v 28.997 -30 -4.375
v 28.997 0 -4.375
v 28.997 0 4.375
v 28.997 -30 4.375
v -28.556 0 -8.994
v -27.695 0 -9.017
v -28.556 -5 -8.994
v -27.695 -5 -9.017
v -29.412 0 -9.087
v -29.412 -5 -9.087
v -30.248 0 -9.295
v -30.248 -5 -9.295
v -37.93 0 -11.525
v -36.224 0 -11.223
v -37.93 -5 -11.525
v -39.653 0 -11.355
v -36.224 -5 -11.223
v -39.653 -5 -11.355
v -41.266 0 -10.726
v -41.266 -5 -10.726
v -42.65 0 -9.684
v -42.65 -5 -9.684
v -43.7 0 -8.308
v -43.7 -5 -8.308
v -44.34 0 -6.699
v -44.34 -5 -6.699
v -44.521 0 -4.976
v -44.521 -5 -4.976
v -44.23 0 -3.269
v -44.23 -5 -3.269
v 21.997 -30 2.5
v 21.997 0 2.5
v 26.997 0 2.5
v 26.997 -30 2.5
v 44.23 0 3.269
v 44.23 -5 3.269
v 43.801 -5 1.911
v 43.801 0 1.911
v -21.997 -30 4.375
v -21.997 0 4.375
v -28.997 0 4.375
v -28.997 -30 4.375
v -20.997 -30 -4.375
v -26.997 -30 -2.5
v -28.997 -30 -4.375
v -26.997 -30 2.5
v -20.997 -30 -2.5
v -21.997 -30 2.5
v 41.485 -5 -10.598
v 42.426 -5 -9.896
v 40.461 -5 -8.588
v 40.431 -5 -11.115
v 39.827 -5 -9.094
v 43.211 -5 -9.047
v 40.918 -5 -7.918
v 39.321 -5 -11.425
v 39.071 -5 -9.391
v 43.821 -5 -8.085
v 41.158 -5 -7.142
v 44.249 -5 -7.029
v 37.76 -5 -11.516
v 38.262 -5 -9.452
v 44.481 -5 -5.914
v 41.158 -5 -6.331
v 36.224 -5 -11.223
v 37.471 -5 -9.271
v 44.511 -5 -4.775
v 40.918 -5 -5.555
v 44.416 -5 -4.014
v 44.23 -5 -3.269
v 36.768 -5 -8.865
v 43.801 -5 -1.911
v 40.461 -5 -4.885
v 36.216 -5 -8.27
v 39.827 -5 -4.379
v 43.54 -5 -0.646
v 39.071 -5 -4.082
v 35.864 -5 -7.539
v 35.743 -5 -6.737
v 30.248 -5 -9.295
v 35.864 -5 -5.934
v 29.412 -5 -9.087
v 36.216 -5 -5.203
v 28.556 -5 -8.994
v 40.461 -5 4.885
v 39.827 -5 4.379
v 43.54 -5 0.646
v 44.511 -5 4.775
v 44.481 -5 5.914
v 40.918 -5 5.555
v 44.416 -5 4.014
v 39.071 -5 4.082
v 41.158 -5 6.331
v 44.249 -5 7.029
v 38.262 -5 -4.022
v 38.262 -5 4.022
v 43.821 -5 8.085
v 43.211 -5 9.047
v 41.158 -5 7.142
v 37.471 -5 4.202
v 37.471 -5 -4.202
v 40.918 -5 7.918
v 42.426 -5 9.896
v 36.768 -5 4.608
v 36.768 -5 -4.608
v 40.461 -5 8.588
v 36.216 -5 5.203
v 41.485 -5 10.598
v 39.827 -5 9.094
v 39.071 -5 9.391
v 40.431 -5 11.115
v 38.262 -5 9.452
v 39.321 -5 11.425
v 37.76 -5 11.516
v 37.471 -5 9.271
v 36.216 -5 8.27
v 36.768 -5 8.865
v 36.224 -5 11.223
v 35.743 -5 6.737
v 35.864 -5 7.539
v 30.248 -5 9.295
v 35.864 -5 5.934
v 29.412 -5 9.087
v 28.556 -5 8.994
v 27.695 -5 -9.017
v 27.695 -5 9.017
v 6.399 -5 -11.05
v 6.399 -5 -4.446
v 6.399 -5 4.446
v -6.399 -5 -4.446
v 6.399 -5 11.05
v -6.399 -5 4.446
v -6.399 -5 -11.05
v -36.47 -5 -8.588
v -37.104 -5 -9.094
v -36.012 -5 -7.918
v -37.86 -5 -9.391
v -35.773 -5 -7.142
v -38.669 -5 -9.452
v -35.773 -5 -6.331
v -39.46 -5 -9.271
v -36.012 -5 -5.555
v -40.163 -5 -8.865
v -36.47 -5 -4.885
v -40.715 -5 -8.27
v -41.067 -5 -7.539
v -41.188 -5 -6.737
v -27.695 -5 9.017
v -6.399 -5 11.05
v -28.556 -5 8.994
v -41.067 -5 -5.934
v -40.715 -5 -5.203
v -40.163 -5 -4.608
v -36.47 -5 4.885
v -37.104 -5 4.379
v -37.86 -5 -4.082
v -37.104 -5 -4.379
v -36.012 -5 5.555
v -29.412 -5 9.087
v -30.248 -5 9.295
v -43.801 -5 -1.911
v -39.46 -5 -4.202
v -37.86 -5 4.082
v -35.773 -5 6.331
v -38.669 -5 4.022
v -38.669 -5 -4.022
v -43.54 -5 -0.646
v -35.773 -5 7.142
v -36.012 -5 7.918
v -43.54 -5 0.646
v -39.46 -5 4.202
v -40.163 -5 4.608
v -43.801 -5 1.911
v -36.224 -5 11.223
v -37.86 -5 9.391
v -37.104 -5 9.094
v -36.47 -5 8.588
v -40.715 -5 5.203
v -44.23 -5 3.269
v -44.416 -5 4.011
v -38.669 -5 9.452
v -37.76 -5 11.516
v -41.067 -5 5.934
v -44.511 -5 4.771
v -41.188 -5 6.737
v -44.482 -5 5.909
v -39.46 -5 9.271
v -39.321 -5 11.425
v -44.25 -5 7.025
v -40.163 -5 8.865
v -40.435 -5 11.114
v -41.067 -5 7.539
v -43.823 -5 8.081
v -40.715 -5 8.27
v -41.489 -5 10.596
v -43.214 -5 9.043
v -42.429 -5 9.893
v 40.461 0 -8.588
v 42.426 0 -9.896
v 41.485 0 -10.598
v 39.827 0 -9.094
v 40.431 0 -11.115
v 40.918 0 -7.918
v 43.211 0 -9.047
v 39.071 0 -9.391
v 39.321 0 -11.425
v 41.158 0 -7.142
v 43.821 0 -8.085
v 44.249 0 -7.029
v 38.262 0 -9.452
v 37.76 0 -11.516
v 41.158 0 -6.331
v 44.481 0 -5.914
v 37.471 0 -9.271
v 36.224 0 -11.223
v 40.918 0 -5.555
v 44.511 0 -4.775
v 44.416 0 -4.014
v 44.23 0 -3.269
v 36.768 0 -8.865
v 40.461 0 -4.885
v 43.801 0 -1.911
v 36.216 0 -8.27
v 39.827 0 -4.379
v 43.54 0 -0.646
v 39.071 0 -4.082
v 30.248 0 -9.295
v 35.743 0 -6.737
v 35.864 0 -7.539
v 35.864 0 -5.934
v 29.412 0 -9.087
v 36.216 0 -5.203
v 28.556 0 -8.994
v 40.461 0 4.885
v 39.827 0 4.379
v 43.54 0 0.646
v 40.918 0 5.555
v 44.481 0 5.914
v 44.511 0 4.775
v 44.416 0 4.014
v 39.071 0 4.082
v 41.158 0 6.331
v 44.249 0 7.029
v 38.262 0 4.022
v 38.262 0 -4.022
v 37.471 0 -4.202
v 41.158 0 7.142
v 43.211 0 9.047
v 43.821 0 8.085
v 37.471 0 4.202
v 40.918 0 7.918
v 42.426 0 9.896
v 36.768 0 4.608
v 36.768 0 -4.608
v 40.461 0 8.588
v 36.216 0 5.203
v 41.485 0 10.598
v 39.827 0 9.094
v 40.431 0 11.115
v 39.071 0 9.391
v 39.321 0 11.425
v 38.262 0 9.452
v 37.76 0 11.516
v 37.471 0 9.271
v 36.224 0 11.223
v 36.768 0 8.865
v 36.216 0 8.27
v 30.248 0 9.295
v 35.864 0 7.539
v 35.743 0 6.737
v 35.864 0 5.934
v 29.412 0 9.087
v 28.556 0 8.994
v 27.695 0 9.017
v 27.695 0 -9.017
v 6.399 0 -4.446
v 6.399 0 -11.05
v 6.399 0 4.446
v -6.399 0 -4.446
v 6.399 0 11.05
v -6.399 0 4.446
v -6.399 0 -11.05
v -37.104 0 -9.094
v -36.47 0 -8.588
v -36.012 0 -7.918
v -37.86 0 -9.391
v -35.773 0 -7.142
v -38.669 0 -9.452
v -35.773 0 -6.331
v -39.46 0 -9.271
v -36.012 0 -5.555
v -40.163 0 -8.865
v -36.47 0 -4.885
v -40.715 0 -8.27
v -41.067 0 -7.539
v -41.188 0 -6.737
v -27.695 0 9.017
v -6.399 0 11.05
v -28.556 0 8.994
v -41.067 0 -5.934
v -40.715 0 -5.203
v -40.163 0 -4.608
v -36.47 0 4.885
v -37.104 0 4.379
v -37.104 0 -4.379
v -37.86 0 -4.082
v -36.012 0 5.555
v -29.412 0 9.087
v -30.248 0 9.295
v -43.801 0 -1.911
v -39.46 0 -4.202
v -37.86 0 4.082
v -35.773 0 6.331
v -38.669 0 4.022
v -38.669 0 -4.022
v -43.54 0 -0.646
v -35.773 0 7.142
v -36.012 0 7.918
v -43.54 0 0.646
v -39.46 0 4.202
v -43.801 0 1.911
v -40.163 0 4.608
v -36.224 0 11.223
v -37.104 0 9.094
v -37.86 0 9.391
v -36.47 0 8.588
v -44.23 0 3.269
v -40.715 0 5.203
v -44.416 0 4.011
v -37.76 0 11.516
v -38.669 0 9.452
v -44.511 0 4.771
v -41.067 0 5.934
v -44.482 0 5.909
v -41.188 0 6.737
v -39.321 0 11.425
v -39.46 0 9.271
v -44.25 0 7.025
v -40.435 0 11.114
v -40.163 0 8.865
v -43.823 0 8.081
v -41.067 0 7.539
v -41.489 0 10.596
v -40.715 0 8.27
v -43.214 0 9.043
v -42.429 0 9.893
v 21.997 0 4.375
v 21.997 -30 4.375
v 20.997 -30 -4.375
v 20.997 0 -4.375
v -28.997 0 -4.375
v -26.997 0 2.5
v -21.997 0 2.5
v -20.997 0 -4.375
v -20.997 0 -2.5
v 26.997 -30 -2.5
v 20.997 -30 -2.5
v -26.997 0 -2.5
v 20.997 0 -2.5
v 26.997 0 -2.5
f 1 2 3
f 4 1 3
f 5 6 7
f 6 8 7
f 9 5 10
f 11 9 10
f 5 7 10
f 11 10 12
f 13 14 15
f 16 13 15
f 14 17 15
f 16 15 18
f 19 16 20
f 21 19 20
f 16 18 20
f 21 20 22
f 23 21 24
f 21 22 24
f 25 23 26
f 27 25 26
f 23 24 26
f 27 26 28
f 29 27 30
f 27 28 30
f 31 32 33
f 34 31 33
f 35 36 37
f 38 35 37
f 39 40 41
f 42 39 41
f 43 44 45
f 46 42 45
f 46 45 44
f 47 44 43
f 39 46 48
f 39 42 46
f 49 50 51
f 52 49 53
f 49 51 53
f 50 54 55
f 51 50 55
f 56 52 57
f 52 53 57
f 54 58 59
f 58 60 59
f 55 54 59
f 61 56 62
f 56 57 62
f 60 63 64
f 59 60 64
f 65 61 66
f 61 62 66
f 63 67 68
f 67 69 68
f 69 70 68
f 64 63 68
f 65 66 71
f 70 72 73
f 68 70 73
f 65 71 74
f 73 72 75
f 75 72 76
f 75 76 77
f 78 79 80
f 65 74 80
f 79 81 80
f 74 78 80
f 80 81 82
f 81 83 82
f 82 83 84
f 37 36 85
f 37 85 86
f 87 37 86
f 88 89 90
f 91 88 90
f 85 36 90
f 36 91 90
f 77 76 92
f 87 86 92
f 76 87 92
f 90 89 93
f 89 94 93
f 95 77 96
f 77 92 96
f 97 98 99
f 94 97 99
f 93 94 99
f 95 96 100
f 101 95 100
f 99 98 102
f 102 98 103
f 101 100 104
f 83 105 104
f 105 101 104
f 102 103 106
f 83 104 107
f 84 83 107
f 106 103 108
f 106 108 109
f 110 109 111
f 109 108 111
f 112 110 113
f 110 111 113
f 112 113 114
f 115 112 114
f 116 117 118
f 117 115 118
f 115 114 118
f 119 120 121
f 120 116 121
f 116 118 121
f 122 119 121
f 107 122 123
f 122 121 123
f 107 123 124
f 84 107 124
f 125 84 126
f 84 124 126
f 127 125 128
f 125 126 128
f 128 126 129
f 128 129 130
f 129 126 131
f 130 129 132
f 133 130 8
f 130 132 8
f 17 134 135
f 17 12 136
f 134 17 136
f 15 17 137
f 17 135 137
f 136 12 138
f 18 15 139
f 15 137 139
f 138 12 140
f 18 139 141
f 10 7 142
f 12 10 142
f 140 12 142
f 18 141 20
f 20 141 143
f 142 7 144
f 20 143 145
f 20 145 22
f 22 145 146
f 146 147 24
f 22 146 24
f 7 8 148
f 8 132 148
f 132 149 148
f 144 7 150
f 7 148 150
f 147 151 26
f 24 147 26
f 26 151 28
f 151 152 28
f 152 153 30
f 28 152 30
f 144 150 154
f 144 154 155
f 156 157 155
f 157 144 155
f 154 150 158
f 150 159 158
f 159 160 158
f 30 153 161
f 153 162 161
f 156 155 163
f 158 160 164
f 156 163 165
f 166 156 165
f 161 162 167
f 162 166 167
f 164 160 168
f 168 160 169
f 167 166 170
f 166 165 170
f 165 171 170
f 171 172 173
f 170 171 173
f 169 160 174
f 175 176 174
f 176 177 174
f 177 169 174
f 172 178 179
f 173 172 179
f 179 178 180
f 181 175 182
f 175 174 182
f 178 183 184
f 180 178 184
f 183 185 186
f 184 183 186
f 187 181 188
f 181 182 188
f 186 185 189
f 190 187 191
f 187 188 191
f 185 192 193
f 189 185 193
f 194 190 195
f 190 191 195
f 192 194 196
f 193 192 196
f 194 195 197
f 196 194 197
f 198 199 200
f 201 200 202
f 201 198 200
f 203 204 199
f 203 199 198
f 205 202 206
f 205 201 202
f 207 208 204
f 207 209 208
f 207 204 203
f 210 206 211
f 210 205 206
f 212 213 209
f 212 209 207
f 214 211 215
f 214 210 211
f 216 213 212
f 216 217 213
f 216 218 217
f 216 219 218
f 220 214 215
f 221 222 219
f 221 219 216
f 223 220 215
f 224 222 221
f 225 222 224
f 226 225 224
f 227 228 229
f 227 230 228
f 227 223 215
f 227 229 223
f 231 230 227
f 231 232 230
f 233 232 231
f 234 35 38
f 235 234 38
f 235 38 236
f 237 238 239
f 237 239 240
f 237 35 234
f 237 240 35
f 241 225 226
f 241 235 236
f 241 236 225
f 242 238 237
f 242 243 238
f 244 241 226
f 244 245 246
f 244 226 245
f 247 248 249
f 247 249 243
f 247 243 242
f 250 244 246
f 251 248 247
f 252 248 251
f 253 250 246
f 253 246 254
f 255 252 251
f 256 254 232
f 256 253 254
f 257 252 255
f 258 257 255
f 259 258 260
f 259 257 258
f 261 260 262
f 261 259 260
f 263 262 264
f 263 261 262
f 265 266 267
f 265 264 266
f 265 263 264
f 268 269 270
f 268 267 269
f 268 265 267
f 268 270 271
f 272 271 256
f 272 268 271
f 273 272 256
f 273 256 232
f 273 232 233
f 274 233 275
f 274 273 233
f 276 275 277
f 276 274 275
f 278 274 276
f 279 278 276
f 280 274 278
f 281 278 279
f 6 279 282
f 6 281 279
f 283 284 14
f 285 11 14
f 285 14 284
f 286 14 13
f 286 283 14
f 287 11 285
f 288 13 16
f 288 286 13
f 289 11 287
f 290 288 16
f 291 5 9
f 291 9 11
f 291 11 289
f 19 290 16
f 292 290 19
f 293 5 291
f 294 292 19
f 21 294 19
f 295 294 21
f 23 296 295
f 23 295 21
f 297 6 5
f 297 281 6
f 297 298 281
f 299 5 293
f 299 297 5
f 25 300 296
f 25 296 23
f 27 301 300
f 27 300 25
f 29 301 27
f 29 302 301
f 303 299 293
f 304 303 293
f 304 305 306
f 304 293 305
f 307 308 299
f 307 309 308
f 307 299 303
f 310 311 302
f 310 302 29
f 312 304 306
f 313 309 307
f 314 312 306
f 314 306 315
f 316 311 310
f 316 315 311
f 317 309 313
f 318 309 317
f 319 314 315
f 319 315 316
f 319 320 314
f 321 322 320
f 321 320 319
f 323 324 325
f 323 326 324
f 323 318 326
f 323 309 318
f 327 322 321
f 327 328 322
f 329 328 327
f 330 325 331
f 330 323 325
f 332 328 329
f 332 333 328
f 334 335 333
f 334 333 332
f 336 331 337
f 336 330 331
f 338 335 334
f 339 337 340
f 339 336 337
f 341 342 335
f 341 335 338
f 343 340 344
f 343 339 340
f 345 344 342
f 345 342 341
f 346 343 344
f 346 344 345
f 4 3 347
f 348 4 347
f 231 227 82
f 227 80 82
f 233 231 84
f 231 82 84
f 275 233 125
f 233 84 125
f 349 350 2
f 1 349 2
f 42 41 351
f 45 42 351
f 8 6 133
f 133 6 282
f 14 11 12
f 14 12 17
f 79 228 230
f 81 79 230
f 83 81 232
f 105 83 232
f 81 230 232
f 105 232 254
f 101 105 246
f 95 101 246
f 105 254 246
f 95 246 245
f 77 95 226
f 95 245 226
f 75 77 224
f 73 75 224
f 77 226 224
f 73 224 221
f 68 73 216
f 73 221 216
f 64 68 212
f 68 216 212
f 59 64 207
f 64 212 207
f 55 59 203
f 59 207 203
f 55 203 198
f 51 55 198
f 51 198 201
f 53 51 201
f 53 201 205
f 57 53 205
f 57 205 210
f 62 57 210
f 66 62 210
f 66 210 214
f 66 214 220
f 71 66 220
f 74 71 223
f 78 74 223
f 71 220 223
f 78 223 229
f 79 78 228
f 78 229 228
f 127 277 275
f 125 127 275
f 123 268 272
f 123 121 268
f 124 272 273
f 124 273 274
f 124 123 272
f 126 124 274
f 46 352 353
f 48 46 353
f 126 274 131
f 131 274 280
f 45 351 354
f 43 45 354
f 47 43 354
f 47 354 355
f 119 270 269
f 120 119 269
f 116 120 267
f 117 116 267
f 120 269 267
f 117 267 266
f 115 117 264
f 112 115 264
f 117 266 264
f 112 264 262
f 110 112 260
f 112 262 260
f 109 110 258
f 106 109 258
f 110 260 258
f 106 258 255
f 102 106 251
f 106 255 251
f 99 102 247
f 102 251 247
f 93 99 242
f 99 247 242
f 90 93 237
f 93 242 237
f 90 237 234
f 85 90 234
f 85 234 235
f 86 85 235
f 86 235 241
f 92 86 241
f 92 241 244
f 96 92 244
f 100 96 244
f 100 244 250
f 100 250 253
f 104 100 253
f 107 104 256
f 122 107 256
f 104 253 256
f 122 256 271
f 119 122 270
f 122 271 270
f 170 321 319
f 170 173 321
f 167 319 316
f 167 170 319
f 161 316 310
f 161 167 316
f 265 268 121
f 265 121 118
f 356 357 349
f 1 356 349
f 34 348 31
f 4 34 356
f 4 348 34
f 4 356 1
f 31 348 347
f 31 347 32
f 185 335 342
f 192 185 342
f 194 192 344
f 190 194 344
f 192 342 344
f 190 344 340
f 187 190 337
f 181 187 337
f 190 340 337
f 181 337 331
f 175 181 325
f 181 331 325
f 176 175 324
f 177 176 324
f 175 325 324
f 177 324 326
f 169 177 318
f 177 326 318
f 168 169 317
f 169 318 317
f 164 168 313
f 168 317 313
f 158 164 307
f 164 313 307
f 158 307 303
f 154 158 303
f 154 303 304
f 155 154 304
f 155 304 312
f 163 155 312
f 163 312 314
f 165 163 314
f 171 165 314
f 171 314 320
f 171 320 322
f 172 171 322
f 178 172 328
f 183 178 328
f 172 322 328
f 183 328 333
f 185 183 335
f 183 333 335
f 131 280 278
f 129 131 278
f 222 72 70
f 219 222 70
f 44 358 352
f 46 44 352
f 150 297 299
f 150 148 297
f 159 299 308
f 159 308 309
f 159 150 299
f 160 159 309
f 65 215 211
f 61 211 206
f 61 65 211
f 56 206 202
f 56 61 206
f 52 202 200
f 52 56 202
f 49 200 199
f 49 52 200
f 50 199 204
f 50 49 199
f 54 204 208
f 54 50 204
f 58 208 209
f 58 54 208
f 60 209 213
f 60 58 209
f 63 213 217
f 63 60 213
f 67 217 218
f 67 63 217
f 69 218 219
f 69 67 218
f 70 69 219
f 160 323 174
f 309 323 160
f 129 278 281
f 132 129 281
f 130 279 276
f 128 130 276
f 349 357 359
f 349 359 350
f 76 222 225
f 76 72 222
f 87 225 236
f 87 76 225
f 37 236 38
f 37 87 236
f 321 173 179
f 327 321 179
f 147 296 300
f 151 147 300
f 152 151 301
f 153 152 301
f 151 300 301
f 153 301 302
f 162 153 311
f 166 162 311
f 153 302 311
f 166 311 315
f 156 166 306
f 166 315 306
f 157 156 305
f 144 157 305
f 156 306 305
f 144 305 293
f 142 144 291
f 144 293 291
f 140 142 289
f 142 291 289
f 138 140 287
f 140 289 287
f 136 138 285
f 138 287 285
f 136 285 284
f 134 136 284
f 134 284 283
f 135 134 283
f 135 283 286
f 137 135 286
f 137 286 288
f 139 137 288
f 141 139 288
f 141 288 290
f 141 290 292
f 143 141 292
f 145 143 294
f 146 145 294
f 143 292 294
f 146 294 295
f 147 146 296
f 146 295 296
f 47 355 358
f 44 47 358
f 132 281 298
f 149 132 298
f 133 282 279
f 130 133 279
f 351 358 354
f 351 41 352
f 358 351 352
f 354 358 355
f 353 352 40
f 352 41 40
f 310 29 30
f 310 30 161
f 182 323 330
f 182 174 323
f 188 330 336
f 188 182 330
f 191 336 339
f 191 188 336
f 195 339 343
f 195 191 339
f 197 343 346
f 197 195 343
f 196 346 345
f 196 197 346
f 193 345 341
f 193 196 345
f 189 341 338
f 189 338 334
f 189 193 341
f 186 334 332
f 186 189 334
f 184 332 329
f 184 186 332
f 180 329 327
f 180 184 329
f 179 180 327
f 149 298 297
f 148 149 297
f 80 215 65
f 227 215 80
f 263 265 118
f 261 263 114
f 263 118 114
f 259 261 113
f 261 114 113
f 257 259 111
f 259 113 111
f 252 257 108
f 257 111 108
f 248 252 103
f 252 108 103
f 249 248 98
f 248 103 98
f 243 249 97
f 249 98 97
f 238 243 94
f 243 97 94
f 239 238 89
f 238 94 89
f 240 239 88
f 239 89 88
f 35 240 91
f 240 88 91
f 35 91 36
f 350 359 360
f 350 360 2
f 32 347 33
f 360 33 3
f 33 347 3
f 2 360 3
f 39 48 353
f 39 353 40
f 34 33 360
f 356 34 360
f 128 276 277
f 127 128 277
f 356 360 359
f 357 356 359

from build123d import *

# Parameters (mm, degrees)
F2_DEPTH = 30
F3_DEPTH = 5
F4_R     = 2.7226233937
F5_DEPTH = 5
F6_R     = 6.35


# Not quite as in the source:
# - a feature names something its author has since deleted; it is built from what else it names


with BuildPart() as f2:
    # F0 (on Front) → F2 (new body)
    with BuildSketch(Plane.XZ):
        Polygon((20.9966870546, -4.375), (28.9966870546, -4.375), (28.9966870546, 0), (28.0000005364, 0), (26.9966870546, 0), (26.9966870546, -2.5), (20.9966870546, -2.5), align=None)
        Polygon((28.0000005364, 0), (28.9966870546, 0), (28.9966870546, 4.375), (21.9966870546, 4.375), (21.9966870546, 2.5), (26.9966870546, 2.5), (26.9966870546, 0), align=None)
    extrude(amount=F2_DEPTH)


with BuildPart() as f2b:
    # F0 (on Front) → F2, piece 2 (new body)
    with BuildSketch(Plane.XZ):
        Polygon((-26.9966870546, -2.5), (-26.9966870546, 0), (-28.0000005364, 0), (-28.9966870546, 0), (-28.9966870546, -4.375), (-20.9966870546, -4.375), (-20.9966870546, -2.5), align=None)
        Polygon((-28.0000005364, 0), (-26.9966870546, 0), (-26.9966870546, 2.5), (-21.9966870546, 2.5), (-21.9966870546, 4.375), (-28.9966870546, 4.375), (-28.9966870546, 0), align=None)
    extrude(amount=F2_DEPTH)


with BuildPart() as f3:
    # F1 (on Front) → F3 (new body)
    with BuildSketch(Plane.XZ):
        Polygon((29, -8.8925119489), (29, 8.8925119489), (6.3987928443, 11.0501443781), (6.3987928443, 4.4462559745), (0, 4.4462559745), (-6.3987928443, 4.4462559745), (-6.3987928443, 11.0501443781), (-29, 8.8925119489), (-29, -8.8925119489), (-6.3987928443, -11.0501443781), (-6.3987928443, -4.4462559745), (0, -4.4462559745), (6.3987928443, -4.4462559745), (6.3987928443, -11.0501443781), align=None)
    extrude(amount=F3_DEPTH)

    # F4 (on face) → F5 (join)
    with BuildSketch(Plane(origin=(0, 0, 0), x_dir=(-1, 0, 0), z_dir=(0, 1, 0))):
        Polygon((-29, -8.8925119489), (-29, 8.8925119489), (-38.4654798061, 11.9462138973), (-47.9309596121, 14.9999158457), (-43.1982197091, 0), (-47.9309596121, -14.9999158457), (-38.4654798061, -11.9462138973), align=None)
        with Locations((-38.4654798061, -6.7365324358)):
            Circle(F4_R, mode=Mode.SUBTRACT)
        with Locations((-38.4654798061, 6.7365324358)):
            Circle(F4_R, mode=Mode.SUBTRACT)
        Polygon((38.4654798061, 11.9462138973), (29, 8.8925119489), (29, -8.8925119489), (47.9309596121, -14.9999158457), (43.1982197091, 0), (47.9309596121, 14.9999158457), align=None)
        with Locations((38.4654798061, -6.7365324358)):
            Circle(F4_R, mode=Mode.SUBTRACT)
        with Locations((38.4654798061, 6.7365324358)):
            Circle(F4_R, mode=Mode.SUBTRACT)
    extrude(amount=-F5_DEPTH)

    # F6
    f6_edges = [f3.edges().sort_by_distance(p)[0] for p in [
        (43.19822, -2.5, 0),
        (47.93096, -2.5, 14.999916),
        (47.93096, -2.5, -14.999916),
        (29, -2.5, -8.892512),
        (-29, -2.5, -8.892512),
        (-47.93096, -2.5, -14.999916),
        (-43.19822, -2.5, 0),
        (-47.93096, -2.5, 14.999916),
        (-29, -2.5, 8.892512),
        (29, -2.5, 8.892512),
    ]]
    fillet(f6_edges, radius=F6_R)


solid = Compound([f2.part, f2b.part, f3.part])
